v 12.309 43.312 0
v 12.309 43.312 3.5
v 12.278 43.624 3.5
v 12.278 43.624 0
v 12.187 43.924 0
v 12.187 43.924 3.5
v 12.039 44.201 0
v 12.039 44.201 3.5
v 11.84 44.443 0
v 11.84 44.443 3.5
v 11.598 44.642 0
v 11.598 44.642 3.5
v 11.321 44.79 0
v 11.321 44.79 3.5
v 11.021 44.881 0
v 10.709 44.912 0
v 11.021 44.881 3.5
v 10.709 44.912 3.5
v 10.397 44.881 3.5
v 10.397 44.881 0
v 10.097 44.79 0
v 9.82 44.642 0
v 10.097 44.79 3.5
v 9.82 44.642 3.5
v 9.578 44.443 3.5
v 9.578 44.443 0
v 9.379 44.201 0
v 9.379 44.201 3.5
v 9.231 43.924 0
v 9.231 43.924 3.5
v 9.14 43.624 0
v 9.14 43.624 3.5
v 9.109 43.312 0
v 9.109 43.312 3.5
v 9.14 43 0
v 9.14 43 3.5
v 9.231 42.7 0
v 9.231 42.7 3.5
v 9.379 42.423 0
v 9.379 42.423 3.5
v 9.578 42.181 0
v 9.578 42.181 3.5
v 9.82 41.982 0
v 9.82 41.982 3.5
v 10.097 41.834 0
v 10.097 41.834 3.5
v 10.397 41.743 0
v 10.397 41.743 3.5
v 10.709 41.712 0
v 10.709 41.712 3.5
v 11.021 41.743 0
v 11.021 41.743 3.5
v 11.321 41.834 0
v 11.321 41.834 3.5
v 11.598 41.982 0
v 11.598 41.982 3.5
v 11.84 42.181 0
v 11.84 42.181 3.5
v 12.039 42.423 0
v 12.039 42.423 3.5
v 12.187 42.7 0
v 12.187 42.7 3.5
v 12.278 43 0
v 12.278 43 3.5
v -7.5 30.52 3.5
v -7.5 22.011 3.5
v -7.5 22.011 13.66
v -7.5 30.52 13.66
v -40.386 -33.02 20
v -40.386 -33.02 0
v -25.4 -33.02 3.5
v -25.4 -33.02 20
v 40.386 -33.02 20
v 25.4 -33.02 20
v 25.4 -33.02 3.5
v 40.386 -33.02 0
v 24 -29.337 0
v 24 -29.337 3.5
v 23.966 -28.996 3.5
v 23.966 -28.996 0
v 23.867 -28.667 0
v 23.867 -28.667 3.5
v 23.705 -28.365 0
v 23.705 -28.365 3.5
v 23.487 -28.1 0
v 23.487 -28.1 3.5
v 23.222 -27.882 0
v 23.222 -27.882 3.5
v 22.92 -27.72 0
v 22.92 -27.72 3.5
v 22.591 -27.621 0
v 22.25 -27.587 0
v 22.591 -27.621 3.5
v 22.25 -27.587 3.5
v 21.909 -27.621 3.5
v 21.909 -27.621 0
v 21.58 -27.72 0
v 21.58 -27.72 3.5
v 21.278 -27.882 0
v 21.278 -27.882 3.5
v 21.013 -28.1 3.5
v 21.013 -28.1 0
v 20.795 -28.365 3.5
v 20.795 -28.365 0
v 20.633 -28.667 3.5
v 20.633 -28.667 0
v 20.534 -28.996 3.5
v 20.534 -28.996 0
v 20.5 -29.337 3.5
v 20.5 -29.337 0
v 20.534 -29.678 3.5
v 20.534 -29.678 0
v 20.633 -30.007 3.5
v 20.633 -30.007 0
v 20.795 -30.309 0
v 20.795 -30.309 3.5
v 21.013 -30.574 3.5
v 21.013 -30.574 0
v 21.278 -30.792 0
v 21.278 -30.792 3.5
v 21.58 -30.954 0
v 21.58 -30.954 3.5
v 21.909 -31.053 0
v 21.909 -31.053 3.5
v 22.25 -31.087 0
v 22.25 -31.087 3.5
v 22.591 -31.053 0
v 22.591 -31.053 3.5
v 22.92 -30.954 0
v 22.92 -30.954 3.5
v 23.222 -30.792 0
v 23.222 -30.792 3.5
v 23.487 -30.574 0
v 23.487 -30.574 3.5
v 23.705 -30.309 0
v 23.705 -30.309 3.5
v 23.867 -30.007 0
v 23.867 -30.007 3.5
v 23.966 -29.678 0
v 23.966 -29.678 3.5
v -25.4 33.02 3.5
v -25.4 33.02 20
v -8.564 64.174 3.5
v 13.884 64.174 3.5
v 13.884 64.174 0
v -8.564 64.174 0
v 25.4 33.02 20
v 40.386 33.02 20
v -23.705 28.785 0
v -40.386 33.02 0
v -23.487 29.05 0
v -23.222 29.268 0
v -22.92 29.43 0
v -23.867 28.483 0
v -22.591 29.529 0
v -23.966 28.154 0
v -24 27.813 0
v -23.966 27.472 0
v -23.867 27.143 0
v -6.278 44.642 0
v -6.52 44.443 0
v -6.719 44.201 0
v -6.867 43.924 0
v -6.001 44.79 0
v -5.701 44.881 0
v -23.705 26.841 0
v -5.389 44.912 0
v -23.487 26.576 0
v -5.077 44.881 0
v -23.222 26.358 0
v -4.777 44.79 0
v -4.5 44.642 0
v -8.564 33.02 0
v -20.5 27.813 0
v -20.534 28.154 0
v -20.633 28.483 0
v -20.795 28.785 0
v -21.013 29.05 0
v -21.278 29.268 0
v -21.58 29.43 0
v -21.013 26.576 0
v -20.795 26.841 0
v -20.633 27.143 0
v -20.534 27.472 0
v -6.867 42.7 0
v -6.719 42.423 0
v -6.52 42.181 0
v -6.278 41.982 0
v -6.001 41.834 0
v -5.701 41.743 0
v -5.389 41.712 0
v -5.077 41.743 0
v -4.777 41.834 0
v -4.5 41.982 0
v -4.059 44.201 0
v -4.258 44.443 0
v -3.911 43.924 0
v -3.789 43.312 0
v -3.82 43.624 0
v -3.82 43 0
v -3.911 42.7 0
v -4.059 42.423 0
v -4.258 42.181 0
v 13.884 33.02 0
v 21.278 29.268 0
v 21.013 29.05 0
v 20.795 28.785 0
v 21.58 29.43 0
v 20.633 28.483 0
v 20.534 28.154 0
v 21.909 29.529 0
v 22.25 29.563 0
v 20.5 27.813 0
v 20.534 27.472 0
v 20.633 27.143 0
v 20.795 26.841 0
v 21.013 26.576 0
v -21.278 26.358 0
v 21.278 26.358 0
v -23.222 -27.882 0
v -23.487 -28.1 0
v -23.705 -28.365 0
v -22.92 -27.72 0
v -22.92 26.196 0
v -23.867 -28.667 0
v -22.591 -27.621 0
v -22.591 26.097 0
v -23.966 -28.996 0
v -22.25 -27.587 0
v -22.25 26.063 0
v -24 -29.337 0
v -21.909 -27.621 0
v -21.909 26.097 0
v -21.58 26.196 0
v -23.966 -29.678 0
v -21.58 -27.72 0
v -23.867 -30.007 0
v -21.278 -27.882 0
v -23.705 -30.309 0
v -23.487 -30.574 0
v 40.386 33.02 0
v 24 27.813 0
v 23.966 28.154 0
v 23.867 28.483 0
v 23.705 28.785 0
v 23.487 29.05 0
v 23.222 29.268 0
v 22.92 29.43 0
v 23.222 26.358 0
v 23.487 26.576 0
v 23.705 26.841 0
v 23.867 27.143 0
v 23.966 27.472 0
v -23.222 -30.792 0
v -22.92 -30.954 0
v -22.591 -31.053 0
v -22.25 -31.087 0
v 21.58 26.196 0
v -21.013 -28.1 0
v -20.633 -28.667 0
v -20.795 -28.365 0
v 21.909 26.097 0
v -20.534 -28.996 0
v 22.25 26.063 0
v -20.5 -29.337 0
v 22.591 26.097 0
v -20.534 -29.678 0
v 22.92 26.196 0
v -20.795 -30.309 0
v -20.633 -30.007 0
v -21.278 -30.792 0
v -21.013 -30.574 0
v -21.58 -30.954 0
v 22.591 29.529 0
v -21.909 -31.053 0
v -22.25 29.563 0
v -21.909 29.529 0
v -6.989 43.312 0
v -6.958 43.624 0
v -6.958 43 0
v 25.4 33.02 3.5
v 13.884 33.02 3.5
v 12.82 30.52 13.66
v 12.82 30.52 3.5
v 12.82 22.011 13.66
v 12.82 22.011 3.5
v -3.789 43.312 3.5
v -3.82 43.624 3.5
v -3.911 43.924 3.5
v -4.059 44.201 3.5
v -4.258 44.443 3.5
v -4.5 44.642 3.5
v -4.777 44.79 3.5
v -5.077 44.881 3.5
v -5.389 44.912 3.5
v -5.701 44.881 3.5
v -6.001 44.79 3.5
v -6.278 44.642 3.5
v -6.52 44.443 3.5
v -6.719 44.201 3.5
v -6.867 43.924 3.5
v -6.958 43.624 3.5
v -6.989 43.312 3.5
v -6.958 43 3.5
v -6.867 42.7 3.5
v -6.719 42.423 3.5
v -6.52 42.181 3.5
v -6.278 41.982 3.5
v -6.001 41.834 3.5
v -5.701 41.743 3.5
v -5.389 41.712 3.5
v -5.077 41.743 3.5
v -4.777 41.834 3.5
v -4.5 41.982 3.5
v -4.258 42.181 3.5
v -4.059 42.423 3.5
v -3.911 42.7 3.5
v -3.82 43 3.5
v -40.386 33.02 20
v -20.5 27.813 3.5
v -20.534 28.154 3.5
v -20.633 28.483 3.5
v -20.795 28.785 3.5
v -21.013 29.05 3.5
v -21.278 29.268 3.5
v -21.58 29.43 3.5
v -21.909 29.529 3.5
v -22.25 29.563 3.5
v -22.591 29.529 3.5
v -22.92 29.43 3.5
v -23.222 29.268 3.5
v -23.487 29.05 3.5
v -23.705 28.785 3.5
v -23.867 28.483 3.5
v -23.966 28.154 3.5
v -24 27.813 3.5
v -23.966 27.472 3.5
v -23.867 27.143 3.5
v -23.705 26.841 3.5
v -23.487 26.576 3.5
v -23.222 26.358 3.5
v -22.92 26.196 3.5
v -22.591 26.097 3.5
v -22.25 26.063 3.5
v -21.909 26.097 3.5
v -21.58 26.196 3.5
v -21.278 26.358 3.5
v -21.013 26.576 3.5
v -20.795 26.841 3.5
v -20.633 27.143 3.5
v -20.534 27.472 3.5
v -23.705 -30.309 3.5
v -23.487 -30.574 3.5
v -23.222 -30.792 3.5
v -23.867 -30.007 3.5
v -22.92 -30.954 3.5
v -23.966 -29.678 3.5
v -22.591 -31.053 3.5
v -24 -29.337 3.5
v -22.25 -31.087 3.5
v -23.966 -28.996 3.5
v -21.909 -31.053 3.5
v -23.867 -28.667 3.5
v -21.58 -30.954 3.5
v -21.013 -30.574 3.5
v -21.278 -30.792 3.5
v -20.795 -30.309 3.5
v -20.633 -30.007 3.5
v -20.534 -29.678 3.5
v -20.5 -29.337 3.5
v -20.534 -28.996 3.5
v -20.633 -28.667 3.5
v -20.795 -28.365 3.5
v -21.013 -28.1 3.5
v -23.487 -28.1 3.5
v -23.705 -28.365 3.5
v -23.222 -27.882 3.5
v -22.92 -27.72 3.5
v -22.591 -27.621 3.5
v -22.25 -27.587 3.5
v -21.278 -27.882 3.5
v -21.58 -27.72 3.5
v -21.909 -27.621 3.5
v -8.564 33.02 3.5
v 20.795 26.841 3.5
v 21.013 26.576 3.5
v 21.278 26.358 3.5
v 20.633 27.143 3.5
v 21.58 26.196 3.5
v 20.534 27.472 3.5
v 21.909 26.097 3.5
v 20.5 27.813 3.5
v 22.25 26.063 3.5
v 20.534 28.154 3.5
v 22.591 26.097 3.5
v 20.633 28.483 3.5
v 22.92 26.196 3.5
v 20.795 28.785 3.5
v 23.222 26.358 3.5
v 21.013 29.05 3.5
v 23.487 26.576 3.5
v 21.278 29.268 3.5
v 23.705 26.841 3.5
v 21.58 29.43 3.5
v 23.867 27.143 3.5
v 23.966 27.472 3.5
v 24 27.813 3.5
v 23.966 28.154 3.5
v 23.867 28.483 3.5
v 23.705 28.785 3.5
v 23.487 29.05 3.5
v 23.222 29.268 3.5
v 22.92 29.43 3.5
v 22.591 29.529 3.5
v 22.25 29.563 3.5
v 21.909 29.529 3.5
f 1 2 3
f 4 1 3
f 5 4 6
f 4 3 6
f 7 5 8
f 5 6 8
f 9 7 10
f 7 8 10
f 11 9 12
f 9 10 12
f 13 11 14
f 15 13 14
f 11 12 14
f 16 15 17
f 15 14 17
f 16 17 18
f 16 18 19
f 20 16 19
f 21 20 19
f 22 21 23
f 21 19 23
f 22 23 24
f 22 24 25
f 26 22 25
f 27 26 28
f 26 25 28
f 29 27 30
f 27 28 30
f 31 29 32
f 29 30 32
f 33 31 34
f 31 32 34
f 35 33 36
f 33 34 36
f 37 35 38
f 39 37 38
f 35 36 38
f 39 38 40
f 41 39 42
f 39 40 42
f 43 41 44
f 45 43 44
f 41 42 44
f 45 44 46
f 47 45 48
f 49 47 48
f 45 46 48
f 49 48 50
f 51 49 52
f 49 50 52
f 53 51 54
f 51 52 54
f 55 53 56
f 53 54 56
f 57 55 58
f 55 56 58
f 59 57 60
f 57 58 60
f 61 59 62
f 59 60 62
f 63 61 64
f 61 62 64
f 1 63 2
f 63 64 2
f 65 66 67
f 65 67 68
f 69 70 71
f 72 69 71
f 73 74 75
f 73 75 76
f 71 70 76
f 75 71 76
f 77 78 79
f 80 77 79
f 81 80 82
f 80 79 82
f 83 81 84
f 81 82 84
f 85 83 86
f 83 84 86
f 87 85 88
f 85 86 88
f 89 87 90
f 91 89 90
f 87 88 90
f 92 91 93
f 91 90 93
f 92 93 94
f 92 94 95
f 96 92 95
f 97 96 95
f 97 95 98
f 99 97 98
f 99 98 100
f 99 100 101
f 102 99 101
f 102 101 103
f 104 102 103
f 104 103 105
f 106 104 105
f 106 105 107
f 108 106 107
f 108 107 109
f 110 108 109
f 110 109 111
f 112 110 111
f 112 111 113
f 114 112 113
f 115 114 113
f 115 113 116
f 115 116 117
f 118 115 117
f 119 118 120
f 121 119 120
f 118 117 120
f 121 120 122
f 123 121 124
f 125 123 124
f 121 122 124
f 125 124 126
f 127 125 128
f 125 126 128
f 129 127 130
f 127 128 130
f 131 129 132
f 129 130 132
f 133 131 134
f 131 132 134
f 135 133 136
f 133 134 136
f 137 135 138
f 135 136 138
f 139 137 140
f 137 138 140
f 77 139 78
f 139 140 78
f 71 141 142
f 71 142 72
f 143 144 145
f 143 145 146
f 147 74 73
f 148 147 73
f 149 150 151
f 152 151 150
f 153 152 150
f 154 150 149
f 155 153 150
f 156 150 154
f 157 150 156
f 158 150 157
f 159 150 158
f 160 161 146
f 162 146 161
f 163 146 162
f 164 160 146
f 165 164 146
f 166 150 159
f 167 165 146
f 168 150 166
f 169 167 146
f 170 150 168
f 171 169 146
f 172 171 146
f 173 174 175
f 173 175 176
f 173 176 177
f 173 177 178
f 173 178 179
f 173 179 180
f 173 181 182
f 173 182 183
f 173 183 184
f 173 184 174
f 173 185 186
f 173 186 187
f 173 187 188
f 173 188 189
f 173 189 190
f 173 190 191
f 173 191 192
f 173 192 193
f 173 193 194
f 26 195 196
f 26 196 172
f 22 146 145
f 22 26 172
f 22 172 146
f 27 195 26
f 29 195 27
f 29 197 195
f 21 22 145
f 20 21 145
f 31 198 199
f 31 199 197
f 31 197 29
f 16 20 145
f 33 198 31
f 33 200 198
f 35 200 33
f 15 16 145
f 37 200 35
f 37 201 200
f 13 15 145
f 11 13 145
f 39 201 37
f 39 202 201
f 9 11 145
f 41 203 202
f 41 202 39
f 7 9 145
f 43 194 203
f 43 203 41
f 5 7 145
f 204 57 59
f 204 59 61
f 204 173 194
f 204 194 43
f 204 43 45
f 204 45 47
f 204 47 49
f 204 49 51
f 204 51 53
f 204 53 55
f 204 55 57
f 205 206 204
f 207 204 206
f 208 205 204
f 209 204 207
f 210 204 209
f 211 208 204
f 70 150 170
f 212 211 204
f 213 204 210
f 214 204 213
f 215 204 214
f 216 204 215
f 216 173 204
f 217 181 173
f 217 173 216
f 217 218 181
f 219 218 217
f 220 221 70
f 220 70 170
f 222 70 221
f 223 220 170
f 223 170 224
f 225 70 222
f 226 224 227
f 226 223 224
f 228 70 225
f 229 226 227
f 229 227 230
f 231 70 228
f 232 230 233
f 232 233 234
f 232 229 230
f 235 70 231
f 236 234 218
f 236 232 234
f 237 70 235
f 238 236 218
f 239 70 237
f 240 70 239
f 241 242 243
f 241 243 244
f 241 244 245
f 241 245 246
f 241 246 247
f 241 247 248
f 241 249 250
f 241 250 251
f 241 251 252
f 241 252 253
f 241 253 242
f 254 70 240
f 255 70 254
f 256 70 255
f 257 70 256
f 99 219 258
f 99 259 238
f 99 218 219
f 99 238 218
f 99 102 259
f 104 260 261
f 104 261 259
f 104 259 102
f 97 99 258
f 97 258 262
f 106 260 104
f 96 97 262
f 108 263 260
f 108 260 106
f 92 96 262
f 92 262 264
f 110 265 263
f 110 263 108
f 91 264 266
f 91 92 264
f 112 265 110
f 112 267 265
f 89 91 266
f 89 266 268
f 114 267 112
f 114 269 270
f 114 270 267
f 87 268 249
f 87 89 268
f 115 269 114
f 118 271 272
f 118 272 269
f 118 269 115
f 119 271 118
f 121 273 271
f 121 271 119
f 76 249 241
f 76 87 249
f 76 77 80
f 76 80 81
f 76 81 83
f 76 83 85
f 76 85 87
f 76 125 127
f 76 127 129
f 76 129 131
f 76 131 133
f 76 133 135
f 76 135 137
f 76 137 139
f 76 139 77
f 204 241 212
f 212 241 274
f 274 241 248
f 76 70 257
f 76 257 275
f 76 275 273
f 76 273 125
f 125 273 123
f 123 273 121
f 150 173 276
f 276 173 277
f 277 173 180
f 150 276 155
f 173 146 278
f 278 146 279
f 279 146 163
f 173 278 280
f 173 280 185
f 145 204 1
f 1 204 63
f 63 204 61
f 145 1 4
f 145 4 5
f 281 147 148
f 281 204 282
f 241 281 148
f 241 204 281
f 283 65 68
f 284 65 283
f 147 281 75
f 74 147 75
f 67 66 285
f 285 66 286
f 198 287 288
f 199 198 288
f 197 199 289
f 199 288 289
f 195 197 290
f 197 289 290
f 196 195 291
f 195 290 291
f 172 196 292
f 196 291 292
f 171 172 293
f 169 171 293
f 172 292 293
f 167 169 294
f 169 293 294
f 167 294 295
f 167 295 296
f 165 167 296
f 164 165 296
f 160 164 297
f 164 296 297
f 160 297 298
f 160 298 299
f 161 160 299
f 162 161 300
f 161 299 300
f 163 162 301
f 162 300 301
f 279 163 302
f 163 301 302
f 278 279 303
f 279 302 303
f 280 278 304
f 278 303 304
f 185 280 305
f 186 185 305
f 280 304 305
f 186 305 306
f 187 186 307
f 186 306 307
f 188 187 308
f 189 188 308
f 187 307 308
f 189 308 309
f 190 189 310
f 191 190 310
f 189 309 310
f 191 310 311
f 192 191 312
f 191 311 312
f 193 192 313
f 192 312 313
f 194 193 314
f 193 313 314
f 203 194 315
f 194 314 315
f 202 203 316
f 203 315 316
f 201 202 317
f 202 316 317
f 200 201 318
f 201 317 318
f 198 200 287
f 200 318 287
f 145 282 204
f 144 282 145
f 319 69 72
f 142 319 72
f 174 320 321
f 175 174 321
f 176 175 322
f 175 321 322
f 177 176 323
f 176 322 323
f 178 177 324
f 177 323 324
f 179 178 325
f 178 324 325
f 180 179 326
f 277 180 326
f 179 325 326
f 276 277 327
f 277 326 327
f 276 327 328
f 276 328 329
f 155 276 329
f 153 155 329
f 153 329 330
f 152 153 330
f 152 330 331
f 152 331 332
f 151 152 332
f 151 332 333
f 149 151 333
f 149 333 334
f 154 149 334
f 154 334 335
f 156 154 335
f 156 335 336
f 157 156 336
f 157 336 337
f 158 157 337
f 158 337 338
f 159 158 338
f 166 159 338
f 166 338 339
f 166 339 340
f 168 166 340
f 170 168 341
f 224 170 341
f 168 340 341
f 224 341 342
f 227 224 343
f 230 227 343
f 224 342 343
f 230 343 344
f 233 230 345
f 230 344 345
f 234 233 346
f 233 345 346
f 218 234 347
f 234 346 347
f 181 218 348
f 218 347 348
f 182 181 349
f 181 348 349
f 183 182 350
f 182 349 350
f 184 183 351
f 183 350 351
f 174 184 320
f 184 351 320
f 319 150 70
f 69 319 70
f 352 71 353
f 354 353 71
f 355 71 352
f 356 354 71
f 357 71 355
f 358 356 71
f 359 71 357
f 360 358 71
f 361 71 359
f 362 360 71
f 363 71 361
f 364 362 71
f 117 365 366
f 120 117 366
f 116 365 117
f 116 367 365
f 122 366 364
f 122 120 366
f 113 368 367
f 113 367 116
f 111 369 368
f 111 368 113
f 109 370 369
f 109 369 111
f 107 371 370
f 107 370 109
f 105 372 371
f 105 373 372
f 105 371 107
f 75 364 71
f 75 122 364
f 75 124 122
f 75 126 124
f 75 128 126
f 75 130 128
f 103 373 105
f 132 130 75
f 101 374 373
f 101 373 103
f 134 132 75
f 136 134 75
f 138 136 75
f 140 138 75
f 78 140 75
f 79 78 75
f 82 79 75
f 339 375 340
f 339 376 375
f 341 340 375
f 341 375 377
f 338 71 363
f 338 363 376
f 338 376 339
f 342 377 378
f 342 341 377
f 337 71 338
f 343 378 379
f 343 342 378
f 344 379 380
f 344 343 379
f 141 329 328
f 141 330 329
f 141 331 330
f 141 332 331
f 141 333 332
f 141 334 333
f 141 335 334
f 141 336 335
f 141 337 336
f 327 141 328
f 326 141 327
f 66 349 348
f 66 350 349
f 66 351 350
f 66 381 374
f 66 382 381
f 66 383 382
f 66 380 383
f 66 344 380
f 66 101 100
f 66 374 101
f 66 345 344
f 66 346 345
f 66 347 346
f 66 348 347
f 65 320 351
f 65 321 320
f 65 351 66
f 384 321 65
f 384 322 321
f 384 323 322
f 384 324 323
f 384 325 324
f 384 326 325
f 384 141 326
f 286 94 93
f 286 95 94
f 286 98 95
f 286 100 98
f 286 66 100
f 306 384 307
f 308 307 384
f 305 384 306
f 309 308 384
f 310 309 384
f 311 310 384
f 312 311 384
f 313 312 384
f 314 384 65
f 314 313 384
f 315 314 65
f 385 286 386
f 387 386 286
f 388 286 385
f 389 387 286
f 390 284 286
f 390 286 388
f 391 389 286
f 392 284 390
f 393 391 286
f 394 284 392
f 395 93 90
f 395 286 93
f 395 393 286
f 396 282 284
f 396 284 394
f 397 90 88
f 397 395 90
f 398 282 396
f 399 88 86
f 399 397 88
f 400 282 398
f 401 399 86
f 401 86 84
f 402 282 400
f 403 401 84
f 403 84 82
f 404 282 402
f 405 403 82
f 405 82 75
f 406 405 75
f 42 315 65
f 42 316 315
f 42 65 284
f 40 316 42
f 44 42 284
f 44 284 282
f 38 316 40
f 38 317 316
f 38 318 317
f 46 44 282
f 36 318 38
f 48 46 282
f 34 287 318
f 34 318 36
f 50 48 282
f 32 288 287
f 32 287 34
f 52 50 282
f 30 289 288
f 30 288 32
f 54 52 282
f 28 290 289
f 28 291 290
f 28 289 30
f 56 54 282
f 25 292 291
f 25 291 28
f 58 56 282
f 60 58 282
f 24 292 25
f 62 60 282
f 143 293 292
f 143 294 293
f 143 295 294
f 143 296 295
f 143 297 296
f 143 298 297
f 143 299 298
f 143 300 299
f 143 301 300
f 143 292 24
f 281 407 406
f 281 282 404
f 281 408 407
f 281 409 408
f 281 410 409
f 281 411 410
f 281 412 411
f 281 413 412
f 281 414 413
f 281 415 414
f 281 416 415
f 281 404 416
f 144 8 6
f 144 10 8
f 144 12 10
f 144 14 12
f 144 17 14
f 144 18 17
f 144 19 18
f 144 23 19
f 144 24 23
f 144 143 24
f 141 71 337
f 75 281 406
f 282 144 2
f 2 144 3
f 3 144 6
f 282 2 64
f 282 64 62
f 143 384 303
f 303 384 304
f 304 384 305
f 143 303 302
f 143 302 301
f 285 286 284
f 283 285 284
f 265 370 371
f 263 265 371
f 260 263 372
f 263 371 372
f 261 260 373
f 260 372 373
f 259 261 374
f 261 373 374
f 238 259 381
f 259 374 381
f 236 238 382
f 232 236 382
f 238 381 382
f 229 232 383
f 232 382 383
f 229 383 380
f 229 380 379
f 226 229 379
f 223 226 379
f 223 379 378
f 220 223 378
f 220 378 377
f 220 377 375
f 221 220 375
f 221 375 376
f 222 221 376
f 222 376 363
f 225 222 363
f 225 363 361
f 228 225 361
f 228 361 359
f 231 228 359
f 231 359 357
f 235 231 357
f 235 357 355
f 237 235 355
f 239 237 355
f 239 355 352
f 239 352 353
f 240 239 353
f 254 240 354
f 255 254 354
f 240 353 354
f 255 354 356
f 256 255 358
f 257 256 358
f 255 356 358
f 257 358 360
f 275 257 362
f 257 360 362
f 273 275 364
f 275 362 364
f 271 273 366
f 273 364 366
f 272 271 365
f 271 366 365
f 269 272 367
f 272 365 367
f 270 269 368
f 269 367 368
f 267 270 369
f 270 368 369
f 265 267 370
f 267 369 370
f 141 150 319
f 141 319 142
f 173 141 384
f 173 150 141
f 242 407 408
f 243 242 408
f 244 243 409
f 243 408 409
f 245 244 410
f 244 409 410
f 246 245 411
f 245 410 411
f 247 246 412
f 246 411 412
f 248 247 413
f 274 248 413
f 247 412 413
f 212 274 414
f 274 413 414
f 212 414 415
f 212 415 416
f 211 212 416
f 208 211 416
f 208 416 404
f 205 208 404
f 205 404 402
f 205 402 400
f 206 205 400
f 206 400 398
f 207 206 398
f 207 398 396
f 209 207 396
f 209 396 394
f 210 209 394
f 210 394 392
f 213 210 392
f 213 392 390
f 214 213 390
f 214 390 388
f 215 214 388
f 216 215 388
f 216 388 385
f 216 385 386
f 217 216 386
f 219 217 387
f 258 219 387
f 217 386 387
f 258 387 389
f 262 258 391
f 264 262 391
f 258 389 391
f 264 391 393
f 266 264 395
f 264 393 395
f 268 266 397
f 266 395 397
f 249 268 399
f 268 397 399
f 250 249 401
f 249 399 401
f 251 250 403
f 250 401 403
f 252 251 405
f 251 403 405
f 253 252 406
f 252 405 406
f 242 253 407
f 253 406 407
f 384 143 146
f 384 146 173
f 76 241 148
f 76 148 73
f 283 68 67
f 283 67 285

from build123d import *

# Parameters (mm, degrees)
F0_W      = 50.8
F0_H      = 66.04
F1_DEPTH  = 3.5
F2_R      = 1.75
F3_DEPTH  = 25
F4_W      = 20.32
F4_H      = 8.509
F5_DEPTH  = 10.16
F6_W      = 14.986
F6_H      = 66.04
F7_DEPTH  = 20
F9_DEPTH  = 3.5
F10_R     = 1.6
F11_DEPTH = 3.5


with BuildPart() as f1:
    # F0 (on Top) → F1 (new body)
    with BuildSketch(Plane.XY):
        Rectangle(F0_W, F0_H)
    extrude(amount=F1_DEPTH)

    # F2 (on face) → F3 (cut)
    with BuildSketch(Plane.XY.offset(3.5)):
        with Locations((-22.25, 27.813)):
            Circle(F2_R)
        with Locations((-22.25, -29.337)):
            Circle(F2_R)
        with Locations((22.25, 27.813)):
            Circle(F2_R)
        with Locations((22.25, -29.337)):
            Circle(F2_R)
    extrude(amount=-F3_DEPTH, mode=Mode.SUBTRACT)

    # F4 (on face) → F5 (join)
    with BuildSketch(Plane.XY.offset(3.5)):
        with Locations((2.66, 26.2655)):
            Rectangle(F4_W, F4_H)
    extrude(amount=F5_DEPTH)

    # F6 (on face) → F7 (join)
    with BuildSketch(Plane(origin=(0, 0, 0), x_dir=(1, 0, 0), z_dir=(0, 0, -1))):
        with Locations((32.893, 0)):
            Rectangle(F6_W, F6_H)
        with Locations((-32.893, 0)):
            Rectangle(F6_W, F6_H)
    extrude(amount=-F7_DEPTH)

    # F8 (on face) → F9 (join, through all)
    with BuildSketch(Plane.XY.offset(3.5)):
        Polygon((13.884, 64.174), (2.66, 64.174), (-8.564, 64.174), (-8.564, 33.02), (13.884, 33.02), align=None)
    extrude(amount=-F9_DEPTH)

    # F10 (on face) → F11 (cut, through all)
    with BuildSketch(Plane.XY.offset(3.5)):
        with Locations((-5.389, 43.312)):
            Circle(F10_R)
        with Locations((10.709, 43.312)):
            Circle(F10_R)
    extrude(amount=-F11_DEPTH, mode=Mode.SUBTRACT)


solid = f1.part
